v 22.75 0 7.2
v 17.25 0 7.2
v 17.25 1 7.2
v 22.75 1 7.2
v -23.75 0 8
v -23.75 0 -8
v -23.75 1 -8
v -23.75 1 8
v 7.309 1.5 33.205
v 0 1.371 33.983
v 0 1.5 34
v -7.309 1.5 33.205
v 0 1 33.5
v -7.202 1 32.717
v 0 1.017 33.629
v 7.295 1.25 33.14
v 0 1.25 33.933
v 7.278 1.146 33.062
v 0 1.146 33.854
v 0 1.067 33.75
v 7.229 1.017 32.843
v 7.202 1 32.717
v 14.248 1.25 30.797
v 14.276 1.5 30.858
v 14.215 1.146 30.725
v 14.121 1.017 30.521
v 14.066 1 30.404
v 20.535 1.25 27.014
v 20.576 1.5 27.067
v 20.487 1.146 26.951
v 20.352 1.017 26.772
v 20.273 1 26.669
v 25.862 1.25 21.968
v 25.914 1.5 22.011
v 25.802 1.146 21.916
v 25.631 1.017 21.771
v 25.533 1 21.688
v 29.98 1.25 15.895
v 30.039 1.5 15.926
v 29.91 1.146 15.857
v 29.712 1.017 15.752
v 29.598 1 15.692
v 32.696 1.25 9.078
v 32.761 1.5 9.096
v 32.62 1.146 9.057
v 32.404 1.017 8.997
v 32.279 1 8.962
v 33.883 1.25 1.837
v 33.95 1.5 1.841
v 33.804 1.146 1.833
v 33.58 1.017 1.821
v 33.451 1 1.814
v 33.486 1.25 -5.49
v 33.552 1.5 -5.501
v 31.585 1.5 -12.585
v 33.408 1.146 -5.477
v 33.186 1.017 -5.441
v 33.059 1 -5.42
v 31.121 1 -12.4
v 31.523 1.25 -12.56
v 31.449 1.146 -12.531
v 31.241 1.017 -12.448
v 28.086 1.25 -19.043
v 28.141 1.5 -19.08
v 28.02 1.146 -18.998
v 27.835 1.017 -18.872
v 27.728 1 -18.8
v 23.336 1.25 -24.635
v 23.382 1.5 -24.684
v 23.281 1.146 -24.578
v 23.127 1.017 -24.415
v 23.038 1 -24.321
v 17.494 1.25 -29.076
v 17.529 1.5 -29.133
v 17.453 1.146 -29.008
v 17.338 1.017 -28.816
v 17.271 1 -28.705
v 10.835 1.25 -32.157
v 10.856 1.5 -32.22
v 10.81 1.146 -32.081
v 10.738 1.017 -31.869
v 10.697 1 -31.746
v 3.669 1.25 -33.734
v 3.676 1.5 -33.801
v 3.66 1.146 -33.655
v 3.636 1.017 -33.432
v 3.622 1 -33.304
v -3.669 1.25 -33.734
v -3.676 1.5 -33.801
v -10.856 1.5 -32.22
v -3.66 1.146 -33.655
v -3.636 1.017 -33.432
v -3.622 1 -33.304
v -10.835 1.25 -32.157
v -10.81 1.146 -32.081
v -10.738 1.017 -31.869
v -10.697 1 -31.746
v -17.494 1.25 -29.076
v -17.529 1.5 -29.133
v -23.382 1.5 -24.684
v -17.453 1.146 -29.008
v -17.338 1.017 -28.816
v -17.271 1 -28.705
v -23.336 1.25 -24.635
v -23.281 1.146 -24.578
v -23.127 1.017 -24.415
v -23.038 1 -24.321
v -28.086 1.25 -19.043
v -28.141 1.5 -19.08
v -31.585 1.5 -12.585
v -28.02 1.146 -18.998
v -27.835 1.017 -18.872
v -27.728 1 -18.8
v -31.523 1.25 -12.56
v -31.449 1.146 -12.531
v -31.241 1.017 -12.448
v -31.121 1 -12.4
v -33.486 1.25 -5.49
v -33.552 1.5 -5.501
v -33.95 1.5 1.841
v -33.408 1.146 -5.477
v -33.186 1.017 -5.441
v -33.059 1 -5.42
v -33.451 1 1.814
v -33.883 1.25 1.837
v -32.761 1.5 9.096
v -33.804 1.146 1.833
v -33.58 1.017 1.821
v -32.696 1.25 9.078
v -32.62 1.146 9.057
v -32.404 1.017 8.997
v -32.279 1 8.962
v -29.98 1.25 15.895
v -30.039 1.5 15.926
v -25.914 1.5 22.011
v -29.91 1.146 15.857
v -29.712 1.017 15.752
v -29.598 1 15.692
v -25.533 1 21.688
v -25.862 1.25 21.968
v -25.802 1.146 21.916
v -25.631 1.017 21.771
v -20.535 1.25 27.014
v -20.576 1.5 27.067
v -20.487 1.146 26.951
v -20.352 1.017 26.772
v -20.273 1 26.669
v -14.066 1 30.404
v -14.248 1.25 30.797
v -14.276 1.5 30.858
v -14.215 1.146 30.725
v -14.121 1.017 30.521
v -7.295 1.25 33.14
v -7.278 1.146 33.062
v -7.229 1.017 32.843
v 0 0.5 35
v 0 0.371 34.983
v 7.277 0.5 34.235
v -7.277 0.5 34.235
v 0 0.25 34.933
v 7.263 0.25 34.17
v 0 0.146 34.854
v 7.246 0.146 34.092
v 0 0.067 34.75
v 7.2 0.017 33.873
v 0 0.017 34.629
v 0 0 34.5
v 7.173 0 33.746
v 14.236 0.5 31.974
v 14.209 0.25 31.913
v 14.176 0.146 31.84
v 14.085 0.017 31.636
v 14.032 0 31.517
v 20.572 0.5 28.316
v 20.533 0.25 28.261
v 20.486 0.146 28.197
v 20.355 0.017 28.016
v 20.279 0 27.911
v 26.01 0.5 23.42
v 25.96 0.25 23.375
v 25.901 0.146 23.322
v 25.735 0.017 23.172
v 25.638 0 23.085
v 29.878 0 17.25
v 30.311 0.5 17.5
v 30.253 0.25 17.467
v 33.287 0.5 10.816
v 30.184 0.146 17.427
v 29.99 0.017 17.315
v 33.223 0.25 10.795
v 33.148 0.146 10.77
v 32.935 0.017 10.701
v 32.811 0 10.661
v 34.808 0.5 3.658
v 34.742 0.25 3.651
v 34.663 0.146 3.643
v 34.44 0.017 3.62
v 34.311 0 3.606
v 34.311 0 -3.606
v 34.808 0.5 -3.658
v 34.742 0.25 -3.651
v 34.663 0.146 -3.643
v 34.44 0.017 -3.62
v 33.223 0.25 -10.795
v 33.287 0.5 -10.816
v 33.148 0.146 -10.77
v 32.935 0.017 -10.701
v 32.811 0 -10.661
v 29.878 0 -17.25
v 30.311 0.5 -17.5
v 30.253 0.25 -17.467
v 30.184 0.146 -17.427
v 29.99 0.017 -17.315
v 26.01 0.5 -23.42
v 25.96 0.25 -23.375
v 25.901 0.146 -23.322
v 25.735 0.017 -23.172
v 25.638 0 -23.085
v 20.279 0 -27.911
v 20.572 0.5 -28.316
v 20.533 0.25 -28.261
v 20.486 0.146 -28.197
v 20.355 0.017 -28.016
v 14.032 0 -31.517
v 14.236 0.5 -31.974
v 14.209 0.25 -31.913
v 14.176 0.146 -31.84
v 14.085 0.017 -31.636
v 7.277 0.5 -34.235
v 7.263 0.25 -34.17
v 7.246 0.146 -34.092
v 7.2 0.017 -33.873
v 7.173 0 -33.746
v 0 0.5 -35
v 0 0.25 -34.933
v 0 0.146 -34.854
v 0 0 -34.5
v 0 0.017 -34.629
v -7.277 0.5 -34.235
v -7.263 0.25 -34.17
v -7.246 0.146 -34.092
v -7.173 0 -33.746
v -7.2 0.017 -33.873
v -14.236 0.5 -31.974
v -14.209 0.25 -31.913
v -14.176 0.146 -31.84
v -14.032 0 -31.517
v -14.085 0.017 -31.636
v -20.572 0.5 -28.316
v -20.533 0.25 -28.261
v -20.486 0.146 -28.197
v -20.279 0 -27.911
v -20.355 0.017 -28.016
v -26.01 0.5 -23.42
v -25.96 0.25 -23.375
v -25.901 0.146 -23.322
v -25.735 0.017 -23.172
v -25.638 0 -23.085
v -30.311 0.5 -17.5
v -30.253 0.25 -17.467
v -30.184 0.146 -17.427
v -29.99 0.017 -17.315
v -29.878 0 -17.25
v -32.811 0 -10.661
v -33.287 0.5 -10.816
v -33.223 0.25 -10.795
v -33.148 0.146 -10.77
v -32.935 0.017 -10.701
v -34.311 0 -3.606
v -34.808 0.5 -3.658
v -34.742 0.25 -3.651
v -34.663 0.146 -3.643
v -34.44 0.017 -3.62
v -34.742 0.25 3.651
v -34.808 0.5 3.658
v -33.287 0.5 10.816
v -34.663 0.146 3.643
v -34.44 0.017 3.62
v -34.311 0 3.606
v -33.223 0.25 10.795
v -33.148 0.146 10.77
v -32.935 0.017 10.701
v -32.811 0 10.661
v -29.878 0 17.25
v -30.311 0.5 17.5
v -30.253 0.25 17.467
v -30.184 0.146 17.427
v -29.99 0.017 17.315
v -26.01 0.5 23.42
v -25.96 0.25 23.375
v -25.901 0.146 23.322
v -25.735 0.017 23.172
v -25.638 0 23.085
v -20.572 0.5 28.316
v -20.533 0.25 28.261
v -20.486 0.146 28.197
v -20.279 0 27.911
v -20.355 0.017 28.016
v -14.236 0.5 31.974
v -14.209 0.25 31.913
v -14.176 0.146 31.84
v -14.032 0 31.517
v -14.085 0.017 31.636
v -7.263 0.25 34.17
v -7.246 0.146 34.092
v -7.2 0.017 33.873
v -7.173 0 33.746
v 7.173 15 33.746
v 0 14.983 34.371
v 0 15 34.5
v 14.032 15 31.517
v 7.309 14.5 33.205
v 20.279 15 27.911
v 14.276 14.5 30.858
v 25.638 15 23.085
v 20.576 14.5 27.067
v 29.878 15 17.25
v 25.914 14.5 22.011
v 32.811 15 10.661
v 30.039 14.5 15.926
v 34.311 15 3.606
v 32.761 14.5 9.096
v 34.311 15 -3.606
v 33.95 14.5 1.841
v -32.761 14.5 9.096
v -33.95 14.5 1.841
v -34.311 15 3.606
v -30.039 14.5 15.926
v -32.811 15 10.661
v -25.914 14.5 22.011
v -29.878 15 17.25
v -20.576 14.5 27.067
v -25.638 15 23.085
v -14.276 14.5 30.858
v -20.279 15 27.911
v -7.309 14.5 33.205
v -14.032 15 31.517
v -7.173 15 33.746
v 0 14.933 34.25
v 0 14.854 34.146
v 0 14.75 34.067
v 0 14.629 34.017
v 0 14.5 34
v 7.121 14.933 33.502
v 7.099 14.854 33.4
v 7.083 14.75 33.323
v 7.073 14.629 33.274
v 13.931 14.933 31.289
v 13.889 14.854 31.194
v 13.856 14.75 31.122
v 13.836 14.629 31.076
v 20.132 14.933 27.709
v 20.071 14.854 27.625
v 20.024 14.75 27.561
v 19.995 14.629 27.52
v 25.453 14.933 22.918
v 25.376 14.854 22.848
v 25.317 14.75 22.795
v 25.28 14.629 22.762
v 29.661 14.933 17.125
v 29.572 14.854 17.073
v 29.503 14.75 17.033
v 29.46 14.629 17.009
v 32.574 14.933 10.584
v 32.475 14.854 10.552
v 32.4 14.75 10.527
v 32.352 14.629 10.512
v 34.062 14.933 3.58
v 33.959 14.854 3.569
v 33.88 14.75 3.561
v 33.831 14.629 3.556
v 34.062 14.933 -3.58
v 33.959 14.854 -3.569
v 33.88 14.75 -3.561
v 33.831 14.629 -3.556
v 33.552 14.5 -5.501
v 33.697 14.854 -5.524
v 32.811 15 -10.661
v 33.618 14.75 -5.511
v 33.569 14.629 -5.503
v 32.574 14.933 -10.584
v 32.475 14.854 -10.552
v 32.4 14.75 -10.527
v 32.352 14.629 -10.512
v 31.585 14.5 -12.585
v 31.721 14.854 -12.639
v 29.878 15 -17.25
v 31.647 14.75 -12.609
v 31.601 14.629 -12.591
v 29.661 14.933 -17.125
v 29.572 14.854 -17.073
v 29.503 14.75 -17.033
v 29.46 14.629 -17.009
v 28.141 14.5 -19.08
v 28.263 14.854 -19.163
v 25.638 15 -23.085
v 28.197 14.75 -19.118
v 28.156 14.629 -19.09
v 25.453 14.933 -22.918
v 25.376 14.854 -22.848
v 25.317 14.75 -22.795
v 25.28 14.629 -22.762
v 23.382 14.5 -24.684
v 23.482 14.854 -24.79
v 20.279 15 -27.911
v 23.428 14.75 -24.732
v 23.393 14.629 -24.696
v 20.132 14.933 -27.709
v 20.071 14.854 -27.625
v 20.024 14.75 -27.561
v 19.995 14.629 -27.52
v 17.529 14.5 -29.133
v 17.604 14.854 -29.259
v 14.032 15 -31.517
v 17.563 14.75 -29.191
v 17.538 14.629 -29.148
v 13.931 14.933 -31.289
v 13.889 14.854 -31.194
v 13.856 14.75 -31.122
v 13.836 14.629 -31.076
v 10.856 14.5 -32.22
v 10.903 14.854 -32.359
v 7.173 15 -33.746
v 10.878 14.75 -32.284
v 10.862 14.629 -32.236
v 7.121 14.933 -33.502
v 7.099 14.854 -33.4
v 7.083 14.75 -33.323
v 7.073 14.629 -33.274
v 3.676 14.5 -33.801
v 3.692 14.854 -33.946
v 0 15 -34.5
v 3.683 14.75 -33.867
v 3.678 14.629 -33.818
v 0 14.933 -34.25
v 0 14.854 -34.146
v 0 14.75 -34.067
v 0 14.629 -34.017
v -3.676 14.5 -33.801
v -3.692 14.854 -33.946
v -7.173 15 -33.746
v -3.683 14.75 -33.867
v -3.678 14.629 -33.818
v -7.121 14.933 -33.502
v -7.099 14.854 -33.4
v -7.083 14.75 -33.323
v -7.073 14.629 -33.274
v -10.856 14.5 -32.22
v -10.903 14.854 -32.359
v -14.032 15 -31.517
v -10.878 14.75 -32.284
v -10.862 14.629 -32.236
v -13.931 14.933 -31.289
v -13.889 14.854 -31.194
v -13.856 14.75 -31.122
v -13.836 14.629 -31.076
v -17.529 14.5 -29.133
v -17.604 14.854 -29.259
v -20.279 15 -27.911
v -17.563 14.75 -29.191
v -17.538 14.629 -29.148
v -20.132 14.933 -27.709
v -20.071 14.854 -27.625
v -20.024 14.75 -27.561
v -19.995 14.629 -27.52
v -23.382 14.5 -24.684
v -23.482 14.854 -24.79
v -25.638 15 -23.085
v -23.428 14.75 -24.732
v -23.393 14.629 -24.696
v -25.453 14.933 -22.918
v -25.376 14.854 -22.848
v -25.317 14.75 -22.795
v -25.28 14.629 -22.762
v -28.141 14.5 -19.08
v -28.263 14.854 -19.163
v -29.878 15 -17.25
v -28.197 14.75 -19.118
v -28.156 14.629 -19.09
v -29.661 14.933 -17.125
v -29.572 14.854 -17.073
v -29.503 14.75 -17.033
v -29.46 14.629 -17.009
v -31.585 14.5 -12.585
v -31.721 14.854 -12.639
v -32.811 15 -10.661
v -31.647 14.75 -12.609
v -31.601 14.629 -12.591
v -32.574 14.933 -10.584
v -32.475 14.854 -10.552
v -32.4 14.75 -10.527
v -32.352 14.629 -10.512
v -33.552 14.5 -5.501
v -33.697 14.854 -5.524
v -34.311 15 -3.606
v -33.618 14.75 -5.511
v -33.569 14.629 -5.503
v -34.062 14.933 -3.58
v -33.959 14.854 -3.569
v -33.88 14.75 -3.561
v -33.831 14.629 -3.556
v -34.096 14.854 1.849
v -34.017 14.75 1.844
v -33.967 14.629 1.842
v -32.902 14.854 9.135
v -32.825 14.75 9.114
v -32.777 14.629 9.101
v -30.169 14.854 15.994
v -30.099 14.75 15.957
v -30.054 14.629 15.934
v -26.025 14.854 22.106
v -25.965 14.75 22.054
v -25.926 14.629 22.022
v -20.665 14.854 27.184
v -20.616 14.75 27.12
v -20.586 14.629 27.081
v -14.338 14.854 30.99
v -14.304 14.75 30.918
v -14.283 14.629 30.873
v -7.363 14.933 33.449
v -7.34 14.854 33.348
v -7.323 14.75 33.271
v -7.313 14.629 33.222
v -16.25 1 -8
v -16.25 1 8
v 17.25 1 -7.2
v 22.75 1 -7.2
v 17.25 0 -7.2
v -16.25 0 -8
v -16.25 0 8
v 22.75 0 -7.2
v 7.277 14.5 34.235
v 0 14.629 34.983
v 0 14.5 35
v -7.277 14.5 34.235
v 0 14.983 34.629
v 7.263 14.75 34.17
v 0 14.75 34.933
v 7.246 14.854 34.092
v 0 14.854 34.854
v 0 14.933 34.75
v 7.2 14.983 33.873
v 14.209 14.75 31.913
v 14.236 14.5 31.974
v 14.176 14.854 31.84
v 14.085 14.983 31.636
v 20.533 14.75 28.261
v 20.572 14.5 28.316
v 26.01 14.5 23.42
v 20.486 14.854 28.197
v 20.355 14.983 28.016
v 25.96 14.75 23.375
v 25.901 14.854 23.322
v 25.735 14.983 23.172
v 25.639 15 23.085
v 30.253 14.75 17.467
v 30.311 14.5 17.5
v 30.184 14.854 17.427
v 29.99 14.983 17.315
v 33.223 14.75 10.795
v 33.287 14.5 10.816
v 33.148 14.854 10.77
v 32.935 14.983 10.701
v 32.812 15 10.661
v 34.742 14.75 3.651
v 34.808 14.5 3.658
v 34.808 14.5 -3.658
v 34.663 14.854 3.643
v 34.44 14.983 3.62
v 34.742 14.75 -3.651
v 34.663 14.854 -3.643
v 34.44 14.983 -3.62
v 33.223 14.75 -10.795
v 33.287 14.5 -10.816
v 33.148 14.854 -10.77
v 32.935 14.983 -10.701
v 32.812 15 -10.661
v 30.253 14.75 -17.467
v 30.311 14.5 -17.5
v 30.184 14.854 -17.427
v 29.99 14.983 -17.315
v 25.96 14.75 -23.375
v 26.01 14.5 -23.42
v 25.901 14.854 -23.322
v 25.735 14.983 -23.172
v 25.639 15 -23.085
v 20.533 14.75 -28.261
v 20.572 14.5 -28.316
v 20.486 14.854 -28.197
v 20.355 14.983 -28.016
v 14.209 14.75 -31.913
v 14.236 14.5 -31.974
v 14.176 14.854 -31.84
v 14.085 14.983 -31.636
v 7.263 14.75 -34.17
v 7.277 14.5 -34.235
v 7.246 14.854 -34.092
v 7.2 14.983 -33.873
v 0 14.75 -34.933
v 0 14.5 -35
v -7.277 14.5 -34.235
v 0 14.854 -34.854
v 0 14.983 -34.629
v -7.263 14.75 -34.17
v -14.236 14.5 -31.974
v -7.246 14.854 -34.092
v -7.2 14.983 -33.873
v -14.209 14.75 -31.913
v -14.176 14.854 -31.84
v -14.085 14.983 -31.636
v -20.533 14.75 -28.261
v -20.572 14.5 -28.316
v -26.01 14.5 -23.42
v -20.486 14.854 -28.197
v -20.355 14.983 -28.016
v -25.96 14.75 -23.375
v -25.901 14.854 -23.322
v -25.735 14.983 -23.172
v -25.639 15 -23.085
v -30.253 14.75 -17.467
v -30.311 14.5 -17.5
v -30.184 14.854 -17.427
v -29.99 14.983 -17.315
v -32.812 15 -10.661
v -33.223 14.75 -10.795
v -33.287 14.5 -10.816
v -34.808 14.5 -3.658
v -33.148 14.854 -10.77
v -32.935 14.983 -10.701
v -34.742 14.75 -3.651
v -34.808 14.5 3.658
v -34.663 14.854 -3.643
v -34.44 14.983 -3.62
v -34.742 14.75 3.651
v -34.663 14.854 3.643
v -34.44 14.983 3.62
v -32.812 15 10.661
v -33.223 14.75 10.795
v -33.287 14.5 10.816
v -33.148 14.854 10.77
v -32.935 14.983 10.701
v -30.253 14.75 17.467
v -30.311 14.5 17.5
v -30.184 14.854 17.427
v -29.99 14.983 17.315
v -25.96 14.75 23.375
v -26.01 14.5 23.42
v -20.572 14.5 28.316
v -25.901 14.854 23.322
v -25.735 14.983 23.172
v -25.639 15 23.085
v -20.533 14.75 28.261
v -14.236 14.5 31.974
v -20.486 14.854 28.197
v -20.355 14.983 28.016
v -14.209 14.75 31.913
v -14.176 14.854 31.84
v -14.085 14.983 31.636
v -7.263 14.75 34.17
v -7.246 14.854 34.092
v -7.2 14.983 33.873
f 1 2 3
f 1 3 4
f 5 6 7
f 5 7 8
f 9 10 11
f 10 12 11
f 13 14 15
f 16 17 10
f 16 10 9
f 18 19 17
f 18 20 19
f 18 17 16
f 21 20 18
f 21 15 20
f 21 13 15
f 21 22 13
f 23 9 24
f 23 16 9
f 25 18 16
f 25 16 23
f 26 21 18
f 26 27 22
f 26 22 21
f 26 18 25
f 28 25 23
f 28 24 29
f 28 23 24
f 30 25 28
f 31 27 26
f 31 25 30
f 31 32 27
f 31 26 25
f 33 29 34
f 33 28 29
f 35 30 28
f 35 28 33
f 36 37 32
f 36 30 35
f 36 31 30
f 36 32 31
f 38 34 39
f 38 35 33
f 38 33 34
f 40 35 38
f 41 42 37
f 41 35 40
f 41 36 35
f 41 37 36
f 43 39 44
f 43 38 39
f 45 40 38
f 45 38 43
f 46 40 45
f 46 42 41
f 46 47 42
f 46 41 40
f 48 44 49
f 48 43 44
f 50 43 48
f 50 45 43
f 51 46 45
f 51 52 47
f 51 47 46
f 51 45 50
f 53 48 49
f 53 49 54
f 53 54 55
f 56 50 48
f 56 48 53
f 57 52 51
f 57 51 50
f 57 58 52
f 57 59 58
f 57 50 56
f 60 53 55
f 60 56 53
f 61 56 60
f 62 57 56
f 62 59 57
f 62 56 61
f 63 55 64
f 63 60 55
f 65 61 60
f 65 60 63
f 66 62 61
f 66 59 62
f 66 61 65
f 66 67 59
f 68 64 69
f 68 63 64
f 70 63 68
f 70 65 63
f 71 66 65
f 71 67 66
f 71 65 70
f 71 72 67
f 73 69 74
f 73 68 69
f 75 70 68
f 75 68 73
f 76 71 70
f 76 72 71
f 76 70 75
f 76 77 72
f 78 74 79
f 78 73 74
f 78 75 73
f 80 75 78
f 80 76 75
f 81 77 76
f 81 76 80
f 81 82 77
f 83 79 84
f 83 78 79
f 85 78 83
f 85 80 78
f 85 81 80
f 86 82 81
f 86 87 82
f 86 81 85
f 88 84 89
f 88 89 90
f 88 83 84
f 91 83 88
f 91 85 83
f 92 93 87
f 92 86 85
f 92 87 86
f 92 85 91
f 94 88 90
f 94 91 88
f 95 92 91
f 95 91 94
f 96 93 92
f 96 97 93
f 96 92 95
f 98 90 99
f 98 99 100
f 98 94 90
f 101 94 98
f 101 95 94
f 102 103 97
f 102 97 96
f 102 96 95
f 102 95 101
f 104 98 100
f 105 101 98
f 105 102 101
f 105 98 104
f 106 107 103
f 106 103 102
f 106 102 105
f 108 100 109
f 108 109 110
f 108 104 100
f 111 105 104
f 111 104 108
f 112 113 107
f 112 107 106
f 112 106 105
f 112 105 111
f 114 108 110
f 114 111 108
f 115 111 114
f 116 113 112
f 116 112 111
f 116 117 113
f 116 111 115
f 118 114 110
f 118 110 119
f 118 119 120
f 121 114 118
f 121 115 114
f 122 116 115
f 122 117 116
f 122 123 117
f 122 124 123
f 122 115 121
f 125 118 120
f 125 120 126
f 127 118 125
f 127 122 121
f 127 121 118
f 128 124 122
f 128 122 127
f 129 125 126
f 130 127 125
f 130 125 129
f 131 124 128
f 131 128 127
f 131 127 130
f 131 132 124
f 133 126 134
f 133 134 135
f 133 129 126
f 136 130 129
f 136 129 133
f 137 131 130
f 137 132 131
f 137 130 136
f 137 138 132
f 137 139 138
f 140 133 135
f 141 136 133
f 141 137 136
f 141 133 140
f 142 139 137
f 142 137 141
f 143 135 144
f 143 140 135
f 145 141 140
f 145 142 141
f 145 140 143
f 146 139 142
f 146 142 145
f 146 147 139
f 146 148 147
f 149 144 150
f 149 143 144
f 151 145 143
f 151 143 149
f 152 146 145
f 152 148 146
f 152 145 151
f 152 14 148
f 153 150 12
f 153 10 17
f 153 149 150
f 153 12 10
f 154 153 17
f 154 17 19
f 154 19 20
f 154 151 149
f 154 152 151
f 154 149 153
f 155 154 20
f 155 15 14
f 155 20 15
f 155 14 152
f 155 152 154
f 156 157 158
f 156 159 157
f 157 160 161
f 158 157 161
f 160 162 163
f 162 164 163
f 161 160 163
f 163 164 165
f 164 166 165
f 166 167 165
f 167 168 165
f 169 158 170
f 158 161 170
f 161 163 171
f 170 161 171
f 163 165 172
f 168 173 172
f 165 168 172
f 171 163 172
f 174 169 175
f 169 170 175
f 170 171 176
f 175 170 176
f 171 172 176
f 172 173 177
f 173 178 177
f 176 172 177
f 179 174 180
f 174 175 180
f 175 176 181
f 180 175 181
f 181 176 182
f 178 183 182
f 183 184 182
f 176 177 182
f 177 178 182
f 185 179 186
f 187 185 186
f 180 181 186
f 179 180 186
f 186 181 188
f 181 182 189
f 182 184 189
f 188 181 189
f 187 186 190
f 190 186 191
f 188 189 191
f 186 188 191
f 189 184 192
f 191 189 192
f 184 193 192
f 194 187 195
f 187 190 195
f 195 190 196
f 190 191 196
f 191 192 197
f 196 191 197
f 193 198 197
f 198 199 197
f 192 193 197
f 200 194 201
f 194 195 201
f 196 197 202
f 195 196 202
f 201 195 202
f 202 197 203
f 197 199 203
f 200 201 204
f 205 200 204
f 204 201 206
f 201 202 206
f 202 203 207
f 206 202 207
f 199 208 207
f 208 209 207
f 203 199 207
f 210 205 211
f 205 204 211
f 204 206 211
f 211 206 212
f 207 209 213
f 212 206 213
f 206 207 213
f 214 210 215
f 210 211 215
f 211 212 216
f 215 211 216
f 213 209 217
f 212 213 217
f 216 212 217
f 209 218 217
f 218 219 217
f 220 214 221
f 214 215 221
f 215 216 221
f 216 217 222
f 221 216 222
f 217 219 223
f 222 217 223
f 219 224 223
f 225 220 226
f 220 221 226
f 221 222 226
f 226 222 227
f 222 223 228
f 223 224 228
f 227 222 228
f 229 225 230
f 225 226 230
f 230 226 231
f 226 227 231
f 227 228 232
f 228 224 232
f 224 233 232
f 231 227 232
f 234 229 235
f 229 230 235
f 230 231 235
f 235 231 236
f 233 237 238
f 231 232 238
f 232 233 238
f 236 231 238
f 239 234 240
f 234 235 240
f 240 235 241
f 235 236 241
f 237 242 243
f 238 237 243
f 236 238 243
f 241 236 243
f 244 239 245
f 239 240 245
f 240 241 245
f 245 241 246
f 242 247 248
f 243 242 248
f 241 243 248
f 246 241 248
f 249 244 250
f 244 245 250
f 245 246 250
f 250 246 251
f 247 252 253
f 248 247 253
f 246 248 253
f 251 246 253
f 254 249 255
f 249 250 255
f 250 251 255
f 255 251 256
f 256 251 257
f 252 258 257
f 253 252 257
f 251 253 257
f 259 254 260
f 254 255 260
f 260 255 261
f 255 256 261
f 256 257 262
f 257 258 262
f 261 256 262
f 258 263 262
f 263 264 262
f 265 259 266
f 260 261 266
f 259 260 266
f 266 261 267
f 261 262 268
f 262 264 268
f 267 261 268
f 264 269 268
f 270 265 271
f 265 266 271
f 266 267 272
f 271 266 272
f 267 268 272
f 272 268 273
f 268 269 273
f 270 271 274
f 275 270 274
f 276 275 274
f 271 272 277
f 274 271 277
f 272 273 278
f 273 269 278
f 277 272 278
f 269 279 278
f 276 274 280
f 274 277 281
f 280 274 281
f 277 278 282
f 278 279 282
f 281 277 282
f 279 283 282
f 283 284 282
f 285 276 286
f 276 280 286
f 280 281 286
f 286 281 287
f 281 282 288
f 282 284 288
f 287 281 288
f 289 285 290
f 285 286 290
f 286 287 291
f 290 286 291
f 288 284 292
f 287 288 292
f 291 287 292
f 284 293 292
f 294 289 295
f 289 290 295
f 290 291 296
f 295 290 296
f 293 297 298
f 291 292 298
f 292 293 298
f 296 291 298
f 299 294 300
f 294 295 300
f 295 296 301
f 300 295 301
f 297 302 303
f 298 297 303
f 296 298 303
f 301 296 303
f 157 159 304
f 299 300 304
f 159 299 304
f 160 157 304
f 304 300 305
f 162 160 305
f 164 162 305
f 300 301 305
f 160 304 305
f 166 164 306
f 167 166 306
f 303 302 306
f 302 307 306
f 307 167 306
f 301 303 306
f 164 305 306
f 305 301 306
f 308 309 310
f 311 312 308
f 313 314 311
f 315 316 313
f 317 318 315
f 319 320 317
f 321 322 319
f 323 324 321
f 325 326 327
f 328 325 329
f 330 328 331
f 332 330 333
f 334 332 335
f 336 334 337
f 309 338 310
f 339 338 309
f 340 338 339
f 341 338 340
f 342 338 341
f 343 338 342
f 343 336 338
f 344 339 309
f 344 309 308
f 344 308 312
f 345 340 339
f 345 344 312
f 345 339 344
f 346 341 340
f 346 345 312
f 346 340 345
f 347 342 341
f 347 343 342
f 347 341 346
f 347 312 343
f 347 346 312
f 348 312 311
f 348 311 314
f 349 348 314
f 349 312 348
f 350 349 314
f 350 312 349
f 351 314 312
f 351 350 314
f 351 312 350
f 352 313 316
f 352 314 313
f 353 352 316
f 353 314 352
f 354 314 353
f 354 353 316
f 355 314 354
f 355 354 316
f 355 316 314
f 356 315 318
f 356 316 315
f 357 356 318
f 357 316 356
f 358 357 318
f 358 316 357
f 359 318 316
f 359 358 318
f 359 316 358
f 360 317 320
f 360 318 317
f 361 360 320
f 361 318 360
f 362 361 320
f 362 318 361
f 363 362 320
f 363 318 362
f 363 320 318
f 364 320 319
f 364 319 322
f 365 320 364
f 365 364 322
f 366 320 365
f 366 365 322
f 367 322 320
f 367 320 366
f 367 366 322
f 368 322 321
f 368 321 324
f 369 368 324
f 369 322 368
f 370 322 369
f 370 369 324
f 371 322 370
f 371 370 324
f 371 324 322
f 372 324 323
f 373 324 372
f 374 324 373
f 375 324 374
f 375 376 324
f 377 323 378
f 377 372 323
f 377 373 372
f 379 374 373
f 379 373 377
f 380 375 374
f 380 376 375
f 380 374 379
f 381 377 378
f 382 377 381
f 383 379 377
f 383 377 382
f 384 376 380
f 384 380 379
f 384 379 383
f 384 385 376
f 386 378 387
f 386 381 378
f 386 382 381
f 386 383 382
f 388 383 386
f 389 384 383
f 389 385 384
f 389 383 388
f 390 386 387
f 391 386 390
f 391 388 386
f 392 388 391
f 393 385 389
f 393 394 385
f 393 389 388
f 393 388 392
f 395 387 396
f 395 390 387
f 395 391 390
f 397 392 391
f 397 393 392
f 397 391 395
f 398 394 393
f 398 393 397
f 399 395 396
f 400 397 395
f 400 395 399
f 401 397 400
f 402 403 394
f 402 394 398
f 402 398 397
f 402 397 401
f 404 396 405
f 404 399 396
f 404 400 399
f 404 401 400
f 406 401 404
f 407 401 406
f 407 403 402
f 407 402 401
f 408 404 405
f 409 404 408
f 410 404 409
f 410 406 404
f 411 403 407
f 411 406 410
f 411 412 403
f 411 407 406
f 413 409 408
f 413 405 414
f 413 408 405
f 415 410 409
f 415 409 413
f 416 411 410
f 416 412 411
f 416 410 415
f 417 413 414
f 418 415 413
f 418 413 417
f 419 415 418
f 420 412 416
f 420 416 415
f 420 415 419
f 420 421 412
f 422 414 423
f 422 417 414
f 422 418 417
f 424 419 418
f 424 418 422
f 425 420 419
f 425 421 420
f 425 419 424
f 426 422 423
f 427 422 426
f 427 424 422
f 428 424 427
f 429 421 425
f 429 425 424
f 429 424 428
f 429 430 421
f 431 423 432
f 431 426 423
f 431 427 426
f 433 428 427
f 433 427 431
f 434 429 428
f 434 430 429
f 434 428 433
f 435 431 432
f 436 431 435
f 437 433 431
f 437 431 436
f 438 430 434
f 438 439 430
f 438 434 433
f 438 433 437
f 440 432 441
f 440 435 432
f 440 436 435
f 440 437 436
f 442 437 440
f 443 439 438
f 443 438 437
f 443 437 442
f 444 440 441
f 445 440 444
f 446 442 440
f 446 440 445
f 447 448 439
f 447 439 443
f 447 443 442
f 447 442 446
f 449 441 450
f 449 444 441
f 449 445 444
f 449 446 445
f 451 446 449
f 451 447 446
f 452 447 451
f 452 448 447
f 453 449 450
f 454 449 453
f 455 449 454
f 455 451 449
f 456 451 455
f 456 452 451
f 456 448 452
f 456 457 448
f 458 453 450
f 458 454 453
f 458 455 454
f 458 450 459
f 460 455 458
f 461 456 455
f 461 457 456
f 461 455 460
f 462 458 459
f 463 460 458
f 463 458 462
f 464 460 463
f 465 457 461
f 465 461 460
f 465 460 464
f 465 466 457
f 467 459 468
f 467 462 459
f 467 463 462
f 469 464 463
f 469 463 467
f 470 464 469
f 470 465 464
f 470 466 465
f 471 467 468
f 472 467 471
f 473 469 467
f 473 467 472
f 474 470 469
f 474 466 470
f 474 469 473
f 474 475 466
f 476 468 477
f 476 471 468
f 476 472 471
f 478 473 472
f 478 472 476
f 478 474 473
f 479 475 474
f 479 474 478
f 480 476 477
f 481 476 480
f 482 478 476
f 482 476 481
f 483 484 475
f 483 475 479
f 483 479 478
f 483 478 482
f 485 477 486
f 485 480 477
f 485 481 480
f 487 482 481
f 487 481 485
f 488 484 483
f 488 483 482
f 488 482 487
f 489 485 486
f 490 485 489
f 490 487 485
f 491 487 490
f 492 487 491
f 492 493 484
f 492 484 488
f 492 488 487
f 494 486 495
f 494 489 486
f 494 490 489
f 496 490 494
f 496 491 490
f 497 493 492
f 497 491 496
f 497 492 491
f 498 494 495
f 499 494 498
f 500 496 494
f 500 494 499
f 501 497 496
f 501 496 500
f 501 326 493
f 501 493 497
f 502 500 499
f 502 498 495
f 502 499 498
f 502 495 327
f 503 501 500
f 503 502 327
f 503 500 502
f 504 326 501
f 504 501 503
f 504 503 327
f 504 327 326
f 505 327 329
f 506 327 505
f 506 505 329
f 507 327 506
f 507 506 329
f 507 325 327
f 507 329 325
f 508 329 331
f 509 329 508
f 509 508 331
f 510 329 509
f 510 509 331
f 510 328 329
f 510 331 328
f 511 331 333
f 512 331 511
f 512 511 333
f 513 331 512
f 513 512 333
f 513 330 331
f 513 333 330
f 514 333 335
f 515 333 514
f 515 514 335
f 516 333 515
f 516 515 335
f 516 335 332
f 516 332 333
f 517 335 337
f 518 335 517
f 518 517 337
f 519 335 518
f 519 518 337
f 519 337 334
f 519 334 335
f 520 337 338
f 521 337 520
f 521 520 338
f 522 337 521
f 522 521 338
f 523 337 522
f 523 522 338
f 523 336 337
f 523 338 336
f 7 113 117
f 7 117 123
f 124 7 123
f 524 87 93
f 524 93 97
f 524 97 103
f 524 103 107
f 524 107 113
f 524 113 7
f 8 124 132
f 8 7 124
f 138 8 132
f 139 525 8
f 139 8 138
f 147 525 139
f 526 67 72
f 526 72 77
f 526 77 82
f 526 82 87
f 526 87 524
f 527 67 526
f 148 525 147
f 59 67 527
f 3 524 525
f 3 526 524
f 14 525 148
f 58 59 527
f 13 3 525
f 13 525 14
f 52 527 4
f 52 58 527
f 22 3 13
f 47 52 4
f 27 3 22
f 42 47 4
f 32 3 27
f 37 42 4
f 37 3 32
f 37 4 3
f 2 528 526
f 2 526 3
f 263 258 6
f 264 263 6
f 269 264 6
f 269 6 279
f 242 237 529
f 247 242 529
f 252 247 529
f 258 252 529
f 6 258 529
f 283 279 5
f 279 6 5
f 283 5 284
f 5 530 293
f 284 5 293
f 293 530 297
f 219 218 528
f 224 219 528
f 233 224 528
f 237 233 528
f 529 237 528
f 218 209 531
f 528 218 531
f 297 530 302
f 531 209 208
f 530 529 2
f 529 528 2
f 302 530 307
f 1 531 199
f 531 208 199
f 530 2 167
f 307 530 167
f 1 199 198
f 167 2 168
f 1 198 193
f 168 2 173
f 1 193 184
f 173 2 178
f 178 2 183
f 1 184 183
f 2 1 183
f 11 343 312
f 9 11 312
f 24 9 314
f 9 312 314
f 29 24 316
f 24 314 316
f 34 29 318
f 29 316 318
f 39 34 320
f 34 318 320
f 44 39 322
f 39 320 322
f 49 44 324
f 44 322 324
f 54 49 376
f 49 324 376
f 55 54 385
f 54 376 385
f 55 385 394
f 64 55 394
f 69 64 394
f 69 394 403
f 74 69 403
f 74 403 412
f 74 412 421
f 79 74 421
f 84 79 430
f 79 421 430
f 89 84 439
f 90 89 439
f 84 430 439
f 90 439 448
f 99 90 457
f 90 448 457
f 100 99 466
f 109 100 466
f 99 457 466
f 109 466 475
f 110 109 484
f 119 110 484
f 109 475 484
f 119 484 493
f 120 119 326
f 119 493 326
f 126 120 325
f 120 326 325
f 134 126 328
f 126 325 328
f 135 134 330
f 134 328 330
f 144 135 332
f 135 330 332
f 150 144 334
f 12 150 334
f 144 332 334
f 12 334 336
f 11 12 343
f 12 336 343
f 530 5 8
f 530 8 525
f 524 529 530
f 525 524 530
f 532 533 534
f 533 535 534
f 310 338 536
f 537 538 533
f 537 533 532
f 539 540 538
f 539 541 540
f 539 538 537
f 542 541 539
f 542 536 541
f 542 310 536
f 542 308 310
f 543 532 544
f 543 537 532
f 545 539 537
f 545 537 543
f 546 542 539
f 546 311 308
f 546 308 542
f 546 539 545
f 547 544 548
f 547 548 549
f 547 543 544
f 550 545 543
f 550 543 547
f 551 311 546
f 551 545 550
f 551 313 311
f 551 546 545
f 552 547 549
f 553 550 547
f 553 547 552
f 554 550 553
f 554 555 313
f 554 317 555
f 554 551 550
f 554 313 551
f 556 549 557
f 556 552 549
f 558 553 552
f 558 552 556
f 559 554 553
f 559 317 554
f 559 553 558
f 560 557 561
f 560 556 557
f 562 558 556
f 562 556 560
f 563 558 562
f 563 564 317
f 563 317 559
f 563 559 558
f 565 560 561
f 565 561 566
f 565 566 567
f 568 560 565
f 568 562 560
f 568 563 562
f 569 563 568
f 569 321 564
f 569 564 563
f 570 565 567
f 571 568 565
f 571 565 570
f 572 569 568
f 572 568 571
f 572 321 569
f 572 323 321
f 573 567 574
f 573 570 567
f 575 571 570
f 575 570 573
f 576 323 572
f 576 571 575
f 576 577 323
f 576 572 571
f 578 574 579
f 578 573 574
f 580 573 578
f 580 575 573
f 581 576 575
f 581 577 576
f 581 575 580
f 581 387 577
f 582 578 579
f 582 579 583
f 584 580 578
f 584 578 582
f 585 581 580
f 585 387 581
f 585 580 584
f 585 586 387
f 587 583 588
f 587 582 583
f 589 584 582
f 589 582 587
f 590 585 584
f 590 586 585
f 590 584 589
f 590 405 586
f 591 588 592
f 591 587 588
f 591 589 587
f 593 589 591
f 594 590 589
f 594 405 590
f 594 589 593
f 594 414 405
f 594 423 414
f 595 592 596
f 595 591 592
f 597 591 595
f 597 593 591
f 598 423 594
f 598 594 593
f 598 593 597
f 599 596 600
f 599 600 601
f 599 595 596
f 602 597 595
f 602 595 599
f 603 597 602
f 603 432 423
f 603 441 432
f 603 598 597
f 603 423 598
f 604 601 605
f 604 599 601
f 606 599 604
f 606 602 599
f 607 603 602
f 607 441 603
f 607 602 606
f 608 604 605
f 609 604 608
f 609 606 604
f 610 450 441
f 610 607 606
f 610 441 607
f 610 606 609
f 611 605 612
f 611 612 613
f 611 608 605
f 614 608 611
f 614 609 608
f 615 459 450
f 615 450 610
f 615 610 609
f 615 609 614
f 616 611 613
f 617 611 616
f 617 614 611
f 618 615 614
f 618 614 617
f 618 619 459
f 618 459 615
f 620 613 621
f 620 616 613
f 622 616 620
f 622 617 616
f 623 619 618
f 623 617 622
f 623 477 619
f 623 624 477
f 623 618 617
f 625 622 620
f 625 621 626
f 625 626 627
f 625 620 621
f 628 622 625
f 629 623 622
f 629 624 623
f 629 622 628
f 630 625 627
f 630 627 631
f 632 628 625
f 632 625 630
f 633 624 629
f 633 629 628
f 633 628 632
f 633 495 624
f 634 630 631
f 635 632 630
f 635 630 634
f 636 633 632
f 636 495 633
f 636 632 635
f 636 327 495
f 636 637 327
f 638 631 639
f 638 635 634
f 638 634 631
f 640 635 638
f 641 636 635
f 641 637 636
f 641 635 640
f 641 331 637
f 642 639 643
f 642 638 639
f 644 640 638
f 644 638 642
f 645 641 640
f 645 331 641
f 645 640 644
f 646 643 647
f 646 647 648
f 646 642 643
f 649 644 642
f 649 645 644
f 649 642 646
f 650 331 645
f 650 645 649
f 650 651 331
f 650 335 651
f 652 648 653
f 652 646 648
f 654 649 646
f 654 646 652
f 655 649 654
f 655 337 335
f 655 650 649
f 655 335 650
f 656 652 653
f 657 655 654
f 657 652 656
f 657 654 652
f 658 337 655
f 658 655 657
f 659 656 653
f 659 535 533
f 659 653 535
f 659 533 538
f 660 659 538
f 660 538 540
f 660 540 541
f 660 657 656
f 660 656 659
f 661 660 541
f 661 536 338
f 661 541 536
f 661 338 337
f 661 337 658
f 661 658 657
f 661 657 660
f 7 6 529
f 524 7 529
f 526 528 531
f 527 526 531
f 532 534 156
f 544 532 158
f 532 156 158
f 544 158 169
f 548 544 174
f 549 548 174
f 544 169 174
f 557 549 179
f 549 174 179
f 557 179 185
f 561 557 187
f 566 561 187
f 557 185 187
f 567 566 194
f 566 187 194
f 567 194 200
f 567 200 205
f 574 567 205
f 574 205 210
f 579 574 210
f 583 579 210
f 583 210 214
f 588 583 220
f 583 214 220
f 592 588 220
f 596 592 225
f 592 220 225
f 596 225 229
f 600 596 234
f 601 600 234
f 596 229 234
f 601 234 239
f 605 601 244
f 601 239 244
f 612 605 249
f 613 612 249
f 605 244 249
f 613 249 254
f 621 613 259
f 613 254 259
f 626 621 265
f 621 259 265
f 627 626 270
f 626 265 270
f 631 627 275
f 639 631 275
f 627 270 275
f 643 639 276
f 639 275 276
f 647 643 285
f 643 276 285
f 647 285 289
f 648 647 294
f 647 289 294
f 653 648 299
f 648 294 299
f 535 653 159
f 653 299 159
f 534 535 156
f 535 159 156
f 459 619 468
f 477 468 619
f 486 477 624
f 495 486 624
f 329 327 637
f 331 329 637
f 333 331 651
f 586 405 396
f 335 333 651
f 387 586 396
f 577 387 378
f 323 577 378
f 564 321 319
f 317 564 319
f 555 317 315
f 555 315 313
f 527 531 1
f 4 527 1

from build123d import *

# Parameters (mm, degrees)
CROQUIS1_R              = 35
SALIENTE_EXTRUIR1_DEPTH = 15
CROQUIS2_R              = 34
CORTAR_EXTRUIR1_DEPTH   = 14
REDONDEO1_R             = 0.5
REDONDEO5_R             = 0.5
CORTAR_EXTRUIR2_REACH   = 53.72
CROQUIS3_W              = 5.5
CROQUIS3_H              = 14.4
CROQUIS3_W_2            = 7.5
CROQUIS3_H_2            = 16


with BuildPart() as part:
    # Croquis1 → Saliente-Extruir1 (new body)
    with BuildSketch(Plane(origin=(0, 0, 0), x_dir=(1, 0, 0), z_dir=(0, 1, 0))):
        with Locations(Location((0, 0, 0), (0, 0, 270))):
            Circle(CROQUIS1_R)
    extrude(amount=SALIENTE_EXTRUIR1_DEPTH)

    # Croquis2 → Cortar-Extruir1 (cut)
    with BuildSketch(Plane(origin=(0, 15, 0), x_dir=(1, 0, 0), z_dir=(0, 1, 0))):
        with Locations(Location((0, 0, 0), (0, 0, 270))):
            Circle(CROQUIS2_R)
    extrude(amount=-CORTAR_EXTRUIR1_DEPTH, mode=Mode.SUBTRACT)

    # Redondeo1
    redondeo1_edges = [part.edges().sort_by_distance(p)[0] for p in [
        (0, 0, -35),
    ]]
    fillet(redondeo1_edges, radius=REDONDEO1_R)

    # Redondeo5
    redondeo5_edges = [part.edges().sort_by_distance(p)[0] for p in [
        (0, 15, -35),
        (0, 15, -34),
        (0, 1, -34),
    ]]
    fillet(redondeo5_edges, radius=REDONDEO5_R - 0.0001)  # a hair under: the kernel refuses the full size

    # Croquis3 → Cortar-Extruir2 (cut, up to next)
    with BuildSketch(Plane.XZ, mode=Mode.PRIVATE) as cortar_extruir2_sk1:
        with Locations((20, 0)):
            Rectangle(CROQUIS3_W, CROQUIS3_H)
    cortar_extruir2_tool1 = extrude(cortar_extruir2_sk1.sketch, amount=-CORTAR_EXTRUIR2_REACH, mode=Mode.PRIVATE) & part.part
    # Croquis3 → Cortar-Extruir2 (cut, up to next)
    with BuildSketch(Plane.XZ, mode=Mode.PRIVATE) as cortar_extruir2_sk2:
        with Locations((-20, 0)):
            Rectangle(CROQUIS3_W_2, CROQUIS3_H_2)
    cortar_extruir2_tool2 = extrude(cortar_extruir2_sk2.sketch, amount=-CORTAR_EXTRUIR2_REACH, mode=Mode.PRIVATE) & part.part
    add(cortar_extruir2_tool1.solids().sort_by_distance((20, 0, 0))[0], mode=Mode.SUBTRACT)
    add(cortar_extruir2_tool2.solids().sort_by_distance((-20, 0, 0))[0], mode=Mode.SUBTRACT)


solid = part.part
